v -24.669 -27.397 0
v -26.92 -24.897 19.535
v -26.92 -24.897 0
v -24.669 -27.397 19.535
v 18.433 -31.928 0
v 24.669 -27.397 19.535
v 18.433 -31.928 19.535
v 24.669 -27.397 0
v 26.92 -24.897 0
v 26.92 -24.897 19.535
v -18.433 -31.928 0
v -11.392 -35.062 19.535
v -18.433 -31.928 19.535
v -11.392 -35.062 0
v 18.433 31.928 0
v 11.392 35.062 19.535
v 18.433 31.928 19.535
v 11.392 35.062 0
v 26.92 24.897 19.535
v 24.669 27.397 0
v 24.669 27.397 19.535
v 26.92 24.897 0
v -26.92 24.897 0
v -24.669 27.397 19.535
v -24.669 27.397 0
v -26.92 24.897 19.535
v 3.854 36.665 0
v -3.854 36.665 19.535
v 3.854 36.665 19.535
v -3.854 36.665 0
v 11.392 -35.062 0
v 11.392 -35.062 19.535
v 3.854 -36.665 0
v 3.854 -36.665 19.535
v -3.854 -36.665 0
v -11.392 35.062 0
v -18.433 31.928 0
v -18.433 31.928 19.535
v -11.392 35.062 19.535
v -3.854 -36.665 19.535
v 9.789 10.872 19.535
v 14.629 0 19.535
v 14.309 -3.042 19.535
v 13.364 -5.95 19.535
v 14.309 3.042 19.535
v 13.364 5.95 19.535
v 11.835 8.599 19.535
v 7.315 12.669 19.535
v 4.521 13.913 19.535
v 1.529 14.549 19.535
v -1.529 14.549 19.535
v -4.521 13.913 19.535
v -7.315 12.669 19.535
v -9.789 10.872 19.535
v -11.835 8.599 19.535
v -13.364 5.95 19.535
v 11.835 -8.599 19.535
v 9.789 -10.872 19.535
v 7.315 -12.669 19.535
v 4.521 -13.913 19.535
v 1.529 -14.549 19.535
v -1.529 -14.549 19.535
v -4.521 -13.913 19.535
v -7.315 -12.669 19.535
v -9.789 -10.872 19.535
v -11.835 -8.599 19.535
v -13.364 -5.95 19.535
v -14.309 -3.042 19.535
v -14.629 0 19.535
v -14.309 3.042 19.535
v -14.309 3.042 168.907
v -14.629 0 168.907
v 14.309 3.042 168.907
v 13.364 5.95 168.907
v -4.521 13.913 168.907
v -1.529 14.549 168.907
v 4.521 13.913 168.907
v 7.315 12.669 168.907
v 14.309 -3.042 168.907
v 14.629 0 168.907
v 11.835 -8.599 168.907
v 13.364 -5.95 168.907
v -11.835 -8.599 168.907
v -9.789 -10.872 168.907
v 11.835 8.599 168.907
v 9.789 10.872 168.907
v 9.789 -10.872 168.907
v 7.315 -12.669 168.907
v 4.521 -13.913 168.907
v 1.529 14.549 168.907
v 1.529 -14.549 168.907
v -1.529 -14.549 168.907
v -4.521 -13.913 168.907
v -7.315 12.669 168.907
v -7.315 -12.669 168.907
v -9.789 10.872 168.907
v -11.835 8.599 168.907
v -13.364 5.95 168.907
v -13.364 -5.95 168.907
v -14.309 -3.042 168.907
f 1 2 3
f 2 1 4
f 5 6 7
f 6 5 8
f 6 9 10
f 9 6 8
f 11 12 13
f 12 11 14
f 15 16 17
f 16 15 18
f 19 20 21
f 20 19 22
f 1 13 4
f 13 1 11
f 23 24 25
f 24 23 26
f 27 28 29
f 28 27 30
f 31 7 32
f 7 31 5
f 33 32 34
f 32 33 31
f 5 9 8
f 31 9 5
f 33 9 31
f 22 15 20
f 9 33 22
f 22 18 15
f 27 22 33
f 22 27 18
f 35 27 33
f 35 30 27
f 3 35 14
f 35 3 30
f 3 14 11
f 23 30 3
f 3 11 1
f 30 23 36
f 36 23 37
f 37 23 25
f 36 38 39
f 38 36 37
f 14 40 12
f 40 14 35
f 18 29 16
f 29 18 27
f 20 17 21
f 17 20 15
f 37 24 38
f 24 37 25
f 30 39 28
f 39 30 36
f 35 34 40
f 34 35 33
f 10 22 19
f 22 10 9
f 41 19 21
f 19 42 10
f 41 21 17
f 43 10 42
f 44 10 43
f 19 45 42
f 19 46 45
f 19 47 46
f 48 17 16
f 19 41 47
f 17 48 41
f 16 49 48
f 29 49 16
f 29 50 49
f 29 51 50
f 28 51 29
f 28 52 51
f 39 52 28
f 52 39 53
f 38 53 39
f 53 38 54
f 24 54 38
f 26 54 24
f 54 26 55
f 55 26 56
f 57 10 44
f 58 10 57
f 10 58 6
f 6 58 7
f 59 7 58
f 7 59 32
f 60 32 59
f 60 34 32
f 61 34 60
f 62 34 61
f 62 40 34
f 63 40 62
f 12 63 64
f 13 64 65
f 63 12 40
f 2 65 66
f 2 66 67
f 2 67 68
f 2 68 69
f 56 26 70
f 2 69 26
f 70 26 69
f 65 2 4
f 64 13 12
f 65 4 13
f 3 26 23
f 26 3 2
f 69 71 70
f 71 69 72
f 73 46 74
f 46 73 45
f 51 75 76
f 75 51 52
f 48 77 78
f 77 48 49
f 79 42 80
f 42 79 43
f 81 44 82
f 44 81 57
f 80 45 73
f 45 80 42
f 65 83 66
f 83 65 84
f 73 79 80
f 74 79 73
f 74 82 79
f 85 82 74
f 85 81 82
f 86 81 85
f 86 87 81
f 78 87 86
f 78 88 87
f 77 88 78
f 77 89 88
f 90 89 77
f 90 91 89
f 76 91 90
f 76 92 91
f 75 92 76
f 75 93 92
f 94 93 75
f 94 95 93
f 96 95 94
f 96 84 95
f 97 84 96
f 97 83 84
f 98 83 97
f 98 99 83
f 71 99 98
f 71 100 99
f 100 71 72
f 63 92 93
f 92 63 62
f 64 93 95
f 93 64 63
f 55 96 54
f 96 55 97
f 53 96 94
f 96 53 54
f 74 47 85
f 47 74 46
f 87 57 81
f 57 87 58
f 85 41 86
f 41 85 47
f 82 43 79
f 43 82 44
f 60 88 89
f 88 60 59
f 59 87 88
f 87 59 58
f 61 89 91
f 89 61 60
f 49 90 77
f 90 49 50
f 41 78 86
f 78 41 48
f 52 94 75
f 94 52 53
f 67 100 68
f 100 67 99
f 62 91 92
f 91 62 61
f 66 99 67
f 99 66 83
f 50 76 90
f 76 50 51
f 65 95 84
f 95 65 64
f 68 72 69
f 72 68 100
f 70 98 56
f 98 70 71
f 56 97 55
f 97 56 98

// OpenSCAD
seed = 15;
seeds = rands(0,1000000,10,seed);
head_size = rands(25,50,1,seeds[1])[0];
head_radius = rands(25,50,1,seeds[2])[0];
bolt_length = rands(head_size*2,200,1,seeds[3])[0];
bolt_radius = rands(head_size/3, head_size/2,1,seeds[0])[0];
cube_size = rands(bolt_radius*2, head_radius*1.6,1, seeds[4])[0];

union(){
    intersection(){
        cylinder(head_size,head_radius,head_radius);
        cube([cube_size,head_radius*2,head_size], center=true);
    }
    cylinder(bolt_length,bolt_radius,bolt_radius);
}
